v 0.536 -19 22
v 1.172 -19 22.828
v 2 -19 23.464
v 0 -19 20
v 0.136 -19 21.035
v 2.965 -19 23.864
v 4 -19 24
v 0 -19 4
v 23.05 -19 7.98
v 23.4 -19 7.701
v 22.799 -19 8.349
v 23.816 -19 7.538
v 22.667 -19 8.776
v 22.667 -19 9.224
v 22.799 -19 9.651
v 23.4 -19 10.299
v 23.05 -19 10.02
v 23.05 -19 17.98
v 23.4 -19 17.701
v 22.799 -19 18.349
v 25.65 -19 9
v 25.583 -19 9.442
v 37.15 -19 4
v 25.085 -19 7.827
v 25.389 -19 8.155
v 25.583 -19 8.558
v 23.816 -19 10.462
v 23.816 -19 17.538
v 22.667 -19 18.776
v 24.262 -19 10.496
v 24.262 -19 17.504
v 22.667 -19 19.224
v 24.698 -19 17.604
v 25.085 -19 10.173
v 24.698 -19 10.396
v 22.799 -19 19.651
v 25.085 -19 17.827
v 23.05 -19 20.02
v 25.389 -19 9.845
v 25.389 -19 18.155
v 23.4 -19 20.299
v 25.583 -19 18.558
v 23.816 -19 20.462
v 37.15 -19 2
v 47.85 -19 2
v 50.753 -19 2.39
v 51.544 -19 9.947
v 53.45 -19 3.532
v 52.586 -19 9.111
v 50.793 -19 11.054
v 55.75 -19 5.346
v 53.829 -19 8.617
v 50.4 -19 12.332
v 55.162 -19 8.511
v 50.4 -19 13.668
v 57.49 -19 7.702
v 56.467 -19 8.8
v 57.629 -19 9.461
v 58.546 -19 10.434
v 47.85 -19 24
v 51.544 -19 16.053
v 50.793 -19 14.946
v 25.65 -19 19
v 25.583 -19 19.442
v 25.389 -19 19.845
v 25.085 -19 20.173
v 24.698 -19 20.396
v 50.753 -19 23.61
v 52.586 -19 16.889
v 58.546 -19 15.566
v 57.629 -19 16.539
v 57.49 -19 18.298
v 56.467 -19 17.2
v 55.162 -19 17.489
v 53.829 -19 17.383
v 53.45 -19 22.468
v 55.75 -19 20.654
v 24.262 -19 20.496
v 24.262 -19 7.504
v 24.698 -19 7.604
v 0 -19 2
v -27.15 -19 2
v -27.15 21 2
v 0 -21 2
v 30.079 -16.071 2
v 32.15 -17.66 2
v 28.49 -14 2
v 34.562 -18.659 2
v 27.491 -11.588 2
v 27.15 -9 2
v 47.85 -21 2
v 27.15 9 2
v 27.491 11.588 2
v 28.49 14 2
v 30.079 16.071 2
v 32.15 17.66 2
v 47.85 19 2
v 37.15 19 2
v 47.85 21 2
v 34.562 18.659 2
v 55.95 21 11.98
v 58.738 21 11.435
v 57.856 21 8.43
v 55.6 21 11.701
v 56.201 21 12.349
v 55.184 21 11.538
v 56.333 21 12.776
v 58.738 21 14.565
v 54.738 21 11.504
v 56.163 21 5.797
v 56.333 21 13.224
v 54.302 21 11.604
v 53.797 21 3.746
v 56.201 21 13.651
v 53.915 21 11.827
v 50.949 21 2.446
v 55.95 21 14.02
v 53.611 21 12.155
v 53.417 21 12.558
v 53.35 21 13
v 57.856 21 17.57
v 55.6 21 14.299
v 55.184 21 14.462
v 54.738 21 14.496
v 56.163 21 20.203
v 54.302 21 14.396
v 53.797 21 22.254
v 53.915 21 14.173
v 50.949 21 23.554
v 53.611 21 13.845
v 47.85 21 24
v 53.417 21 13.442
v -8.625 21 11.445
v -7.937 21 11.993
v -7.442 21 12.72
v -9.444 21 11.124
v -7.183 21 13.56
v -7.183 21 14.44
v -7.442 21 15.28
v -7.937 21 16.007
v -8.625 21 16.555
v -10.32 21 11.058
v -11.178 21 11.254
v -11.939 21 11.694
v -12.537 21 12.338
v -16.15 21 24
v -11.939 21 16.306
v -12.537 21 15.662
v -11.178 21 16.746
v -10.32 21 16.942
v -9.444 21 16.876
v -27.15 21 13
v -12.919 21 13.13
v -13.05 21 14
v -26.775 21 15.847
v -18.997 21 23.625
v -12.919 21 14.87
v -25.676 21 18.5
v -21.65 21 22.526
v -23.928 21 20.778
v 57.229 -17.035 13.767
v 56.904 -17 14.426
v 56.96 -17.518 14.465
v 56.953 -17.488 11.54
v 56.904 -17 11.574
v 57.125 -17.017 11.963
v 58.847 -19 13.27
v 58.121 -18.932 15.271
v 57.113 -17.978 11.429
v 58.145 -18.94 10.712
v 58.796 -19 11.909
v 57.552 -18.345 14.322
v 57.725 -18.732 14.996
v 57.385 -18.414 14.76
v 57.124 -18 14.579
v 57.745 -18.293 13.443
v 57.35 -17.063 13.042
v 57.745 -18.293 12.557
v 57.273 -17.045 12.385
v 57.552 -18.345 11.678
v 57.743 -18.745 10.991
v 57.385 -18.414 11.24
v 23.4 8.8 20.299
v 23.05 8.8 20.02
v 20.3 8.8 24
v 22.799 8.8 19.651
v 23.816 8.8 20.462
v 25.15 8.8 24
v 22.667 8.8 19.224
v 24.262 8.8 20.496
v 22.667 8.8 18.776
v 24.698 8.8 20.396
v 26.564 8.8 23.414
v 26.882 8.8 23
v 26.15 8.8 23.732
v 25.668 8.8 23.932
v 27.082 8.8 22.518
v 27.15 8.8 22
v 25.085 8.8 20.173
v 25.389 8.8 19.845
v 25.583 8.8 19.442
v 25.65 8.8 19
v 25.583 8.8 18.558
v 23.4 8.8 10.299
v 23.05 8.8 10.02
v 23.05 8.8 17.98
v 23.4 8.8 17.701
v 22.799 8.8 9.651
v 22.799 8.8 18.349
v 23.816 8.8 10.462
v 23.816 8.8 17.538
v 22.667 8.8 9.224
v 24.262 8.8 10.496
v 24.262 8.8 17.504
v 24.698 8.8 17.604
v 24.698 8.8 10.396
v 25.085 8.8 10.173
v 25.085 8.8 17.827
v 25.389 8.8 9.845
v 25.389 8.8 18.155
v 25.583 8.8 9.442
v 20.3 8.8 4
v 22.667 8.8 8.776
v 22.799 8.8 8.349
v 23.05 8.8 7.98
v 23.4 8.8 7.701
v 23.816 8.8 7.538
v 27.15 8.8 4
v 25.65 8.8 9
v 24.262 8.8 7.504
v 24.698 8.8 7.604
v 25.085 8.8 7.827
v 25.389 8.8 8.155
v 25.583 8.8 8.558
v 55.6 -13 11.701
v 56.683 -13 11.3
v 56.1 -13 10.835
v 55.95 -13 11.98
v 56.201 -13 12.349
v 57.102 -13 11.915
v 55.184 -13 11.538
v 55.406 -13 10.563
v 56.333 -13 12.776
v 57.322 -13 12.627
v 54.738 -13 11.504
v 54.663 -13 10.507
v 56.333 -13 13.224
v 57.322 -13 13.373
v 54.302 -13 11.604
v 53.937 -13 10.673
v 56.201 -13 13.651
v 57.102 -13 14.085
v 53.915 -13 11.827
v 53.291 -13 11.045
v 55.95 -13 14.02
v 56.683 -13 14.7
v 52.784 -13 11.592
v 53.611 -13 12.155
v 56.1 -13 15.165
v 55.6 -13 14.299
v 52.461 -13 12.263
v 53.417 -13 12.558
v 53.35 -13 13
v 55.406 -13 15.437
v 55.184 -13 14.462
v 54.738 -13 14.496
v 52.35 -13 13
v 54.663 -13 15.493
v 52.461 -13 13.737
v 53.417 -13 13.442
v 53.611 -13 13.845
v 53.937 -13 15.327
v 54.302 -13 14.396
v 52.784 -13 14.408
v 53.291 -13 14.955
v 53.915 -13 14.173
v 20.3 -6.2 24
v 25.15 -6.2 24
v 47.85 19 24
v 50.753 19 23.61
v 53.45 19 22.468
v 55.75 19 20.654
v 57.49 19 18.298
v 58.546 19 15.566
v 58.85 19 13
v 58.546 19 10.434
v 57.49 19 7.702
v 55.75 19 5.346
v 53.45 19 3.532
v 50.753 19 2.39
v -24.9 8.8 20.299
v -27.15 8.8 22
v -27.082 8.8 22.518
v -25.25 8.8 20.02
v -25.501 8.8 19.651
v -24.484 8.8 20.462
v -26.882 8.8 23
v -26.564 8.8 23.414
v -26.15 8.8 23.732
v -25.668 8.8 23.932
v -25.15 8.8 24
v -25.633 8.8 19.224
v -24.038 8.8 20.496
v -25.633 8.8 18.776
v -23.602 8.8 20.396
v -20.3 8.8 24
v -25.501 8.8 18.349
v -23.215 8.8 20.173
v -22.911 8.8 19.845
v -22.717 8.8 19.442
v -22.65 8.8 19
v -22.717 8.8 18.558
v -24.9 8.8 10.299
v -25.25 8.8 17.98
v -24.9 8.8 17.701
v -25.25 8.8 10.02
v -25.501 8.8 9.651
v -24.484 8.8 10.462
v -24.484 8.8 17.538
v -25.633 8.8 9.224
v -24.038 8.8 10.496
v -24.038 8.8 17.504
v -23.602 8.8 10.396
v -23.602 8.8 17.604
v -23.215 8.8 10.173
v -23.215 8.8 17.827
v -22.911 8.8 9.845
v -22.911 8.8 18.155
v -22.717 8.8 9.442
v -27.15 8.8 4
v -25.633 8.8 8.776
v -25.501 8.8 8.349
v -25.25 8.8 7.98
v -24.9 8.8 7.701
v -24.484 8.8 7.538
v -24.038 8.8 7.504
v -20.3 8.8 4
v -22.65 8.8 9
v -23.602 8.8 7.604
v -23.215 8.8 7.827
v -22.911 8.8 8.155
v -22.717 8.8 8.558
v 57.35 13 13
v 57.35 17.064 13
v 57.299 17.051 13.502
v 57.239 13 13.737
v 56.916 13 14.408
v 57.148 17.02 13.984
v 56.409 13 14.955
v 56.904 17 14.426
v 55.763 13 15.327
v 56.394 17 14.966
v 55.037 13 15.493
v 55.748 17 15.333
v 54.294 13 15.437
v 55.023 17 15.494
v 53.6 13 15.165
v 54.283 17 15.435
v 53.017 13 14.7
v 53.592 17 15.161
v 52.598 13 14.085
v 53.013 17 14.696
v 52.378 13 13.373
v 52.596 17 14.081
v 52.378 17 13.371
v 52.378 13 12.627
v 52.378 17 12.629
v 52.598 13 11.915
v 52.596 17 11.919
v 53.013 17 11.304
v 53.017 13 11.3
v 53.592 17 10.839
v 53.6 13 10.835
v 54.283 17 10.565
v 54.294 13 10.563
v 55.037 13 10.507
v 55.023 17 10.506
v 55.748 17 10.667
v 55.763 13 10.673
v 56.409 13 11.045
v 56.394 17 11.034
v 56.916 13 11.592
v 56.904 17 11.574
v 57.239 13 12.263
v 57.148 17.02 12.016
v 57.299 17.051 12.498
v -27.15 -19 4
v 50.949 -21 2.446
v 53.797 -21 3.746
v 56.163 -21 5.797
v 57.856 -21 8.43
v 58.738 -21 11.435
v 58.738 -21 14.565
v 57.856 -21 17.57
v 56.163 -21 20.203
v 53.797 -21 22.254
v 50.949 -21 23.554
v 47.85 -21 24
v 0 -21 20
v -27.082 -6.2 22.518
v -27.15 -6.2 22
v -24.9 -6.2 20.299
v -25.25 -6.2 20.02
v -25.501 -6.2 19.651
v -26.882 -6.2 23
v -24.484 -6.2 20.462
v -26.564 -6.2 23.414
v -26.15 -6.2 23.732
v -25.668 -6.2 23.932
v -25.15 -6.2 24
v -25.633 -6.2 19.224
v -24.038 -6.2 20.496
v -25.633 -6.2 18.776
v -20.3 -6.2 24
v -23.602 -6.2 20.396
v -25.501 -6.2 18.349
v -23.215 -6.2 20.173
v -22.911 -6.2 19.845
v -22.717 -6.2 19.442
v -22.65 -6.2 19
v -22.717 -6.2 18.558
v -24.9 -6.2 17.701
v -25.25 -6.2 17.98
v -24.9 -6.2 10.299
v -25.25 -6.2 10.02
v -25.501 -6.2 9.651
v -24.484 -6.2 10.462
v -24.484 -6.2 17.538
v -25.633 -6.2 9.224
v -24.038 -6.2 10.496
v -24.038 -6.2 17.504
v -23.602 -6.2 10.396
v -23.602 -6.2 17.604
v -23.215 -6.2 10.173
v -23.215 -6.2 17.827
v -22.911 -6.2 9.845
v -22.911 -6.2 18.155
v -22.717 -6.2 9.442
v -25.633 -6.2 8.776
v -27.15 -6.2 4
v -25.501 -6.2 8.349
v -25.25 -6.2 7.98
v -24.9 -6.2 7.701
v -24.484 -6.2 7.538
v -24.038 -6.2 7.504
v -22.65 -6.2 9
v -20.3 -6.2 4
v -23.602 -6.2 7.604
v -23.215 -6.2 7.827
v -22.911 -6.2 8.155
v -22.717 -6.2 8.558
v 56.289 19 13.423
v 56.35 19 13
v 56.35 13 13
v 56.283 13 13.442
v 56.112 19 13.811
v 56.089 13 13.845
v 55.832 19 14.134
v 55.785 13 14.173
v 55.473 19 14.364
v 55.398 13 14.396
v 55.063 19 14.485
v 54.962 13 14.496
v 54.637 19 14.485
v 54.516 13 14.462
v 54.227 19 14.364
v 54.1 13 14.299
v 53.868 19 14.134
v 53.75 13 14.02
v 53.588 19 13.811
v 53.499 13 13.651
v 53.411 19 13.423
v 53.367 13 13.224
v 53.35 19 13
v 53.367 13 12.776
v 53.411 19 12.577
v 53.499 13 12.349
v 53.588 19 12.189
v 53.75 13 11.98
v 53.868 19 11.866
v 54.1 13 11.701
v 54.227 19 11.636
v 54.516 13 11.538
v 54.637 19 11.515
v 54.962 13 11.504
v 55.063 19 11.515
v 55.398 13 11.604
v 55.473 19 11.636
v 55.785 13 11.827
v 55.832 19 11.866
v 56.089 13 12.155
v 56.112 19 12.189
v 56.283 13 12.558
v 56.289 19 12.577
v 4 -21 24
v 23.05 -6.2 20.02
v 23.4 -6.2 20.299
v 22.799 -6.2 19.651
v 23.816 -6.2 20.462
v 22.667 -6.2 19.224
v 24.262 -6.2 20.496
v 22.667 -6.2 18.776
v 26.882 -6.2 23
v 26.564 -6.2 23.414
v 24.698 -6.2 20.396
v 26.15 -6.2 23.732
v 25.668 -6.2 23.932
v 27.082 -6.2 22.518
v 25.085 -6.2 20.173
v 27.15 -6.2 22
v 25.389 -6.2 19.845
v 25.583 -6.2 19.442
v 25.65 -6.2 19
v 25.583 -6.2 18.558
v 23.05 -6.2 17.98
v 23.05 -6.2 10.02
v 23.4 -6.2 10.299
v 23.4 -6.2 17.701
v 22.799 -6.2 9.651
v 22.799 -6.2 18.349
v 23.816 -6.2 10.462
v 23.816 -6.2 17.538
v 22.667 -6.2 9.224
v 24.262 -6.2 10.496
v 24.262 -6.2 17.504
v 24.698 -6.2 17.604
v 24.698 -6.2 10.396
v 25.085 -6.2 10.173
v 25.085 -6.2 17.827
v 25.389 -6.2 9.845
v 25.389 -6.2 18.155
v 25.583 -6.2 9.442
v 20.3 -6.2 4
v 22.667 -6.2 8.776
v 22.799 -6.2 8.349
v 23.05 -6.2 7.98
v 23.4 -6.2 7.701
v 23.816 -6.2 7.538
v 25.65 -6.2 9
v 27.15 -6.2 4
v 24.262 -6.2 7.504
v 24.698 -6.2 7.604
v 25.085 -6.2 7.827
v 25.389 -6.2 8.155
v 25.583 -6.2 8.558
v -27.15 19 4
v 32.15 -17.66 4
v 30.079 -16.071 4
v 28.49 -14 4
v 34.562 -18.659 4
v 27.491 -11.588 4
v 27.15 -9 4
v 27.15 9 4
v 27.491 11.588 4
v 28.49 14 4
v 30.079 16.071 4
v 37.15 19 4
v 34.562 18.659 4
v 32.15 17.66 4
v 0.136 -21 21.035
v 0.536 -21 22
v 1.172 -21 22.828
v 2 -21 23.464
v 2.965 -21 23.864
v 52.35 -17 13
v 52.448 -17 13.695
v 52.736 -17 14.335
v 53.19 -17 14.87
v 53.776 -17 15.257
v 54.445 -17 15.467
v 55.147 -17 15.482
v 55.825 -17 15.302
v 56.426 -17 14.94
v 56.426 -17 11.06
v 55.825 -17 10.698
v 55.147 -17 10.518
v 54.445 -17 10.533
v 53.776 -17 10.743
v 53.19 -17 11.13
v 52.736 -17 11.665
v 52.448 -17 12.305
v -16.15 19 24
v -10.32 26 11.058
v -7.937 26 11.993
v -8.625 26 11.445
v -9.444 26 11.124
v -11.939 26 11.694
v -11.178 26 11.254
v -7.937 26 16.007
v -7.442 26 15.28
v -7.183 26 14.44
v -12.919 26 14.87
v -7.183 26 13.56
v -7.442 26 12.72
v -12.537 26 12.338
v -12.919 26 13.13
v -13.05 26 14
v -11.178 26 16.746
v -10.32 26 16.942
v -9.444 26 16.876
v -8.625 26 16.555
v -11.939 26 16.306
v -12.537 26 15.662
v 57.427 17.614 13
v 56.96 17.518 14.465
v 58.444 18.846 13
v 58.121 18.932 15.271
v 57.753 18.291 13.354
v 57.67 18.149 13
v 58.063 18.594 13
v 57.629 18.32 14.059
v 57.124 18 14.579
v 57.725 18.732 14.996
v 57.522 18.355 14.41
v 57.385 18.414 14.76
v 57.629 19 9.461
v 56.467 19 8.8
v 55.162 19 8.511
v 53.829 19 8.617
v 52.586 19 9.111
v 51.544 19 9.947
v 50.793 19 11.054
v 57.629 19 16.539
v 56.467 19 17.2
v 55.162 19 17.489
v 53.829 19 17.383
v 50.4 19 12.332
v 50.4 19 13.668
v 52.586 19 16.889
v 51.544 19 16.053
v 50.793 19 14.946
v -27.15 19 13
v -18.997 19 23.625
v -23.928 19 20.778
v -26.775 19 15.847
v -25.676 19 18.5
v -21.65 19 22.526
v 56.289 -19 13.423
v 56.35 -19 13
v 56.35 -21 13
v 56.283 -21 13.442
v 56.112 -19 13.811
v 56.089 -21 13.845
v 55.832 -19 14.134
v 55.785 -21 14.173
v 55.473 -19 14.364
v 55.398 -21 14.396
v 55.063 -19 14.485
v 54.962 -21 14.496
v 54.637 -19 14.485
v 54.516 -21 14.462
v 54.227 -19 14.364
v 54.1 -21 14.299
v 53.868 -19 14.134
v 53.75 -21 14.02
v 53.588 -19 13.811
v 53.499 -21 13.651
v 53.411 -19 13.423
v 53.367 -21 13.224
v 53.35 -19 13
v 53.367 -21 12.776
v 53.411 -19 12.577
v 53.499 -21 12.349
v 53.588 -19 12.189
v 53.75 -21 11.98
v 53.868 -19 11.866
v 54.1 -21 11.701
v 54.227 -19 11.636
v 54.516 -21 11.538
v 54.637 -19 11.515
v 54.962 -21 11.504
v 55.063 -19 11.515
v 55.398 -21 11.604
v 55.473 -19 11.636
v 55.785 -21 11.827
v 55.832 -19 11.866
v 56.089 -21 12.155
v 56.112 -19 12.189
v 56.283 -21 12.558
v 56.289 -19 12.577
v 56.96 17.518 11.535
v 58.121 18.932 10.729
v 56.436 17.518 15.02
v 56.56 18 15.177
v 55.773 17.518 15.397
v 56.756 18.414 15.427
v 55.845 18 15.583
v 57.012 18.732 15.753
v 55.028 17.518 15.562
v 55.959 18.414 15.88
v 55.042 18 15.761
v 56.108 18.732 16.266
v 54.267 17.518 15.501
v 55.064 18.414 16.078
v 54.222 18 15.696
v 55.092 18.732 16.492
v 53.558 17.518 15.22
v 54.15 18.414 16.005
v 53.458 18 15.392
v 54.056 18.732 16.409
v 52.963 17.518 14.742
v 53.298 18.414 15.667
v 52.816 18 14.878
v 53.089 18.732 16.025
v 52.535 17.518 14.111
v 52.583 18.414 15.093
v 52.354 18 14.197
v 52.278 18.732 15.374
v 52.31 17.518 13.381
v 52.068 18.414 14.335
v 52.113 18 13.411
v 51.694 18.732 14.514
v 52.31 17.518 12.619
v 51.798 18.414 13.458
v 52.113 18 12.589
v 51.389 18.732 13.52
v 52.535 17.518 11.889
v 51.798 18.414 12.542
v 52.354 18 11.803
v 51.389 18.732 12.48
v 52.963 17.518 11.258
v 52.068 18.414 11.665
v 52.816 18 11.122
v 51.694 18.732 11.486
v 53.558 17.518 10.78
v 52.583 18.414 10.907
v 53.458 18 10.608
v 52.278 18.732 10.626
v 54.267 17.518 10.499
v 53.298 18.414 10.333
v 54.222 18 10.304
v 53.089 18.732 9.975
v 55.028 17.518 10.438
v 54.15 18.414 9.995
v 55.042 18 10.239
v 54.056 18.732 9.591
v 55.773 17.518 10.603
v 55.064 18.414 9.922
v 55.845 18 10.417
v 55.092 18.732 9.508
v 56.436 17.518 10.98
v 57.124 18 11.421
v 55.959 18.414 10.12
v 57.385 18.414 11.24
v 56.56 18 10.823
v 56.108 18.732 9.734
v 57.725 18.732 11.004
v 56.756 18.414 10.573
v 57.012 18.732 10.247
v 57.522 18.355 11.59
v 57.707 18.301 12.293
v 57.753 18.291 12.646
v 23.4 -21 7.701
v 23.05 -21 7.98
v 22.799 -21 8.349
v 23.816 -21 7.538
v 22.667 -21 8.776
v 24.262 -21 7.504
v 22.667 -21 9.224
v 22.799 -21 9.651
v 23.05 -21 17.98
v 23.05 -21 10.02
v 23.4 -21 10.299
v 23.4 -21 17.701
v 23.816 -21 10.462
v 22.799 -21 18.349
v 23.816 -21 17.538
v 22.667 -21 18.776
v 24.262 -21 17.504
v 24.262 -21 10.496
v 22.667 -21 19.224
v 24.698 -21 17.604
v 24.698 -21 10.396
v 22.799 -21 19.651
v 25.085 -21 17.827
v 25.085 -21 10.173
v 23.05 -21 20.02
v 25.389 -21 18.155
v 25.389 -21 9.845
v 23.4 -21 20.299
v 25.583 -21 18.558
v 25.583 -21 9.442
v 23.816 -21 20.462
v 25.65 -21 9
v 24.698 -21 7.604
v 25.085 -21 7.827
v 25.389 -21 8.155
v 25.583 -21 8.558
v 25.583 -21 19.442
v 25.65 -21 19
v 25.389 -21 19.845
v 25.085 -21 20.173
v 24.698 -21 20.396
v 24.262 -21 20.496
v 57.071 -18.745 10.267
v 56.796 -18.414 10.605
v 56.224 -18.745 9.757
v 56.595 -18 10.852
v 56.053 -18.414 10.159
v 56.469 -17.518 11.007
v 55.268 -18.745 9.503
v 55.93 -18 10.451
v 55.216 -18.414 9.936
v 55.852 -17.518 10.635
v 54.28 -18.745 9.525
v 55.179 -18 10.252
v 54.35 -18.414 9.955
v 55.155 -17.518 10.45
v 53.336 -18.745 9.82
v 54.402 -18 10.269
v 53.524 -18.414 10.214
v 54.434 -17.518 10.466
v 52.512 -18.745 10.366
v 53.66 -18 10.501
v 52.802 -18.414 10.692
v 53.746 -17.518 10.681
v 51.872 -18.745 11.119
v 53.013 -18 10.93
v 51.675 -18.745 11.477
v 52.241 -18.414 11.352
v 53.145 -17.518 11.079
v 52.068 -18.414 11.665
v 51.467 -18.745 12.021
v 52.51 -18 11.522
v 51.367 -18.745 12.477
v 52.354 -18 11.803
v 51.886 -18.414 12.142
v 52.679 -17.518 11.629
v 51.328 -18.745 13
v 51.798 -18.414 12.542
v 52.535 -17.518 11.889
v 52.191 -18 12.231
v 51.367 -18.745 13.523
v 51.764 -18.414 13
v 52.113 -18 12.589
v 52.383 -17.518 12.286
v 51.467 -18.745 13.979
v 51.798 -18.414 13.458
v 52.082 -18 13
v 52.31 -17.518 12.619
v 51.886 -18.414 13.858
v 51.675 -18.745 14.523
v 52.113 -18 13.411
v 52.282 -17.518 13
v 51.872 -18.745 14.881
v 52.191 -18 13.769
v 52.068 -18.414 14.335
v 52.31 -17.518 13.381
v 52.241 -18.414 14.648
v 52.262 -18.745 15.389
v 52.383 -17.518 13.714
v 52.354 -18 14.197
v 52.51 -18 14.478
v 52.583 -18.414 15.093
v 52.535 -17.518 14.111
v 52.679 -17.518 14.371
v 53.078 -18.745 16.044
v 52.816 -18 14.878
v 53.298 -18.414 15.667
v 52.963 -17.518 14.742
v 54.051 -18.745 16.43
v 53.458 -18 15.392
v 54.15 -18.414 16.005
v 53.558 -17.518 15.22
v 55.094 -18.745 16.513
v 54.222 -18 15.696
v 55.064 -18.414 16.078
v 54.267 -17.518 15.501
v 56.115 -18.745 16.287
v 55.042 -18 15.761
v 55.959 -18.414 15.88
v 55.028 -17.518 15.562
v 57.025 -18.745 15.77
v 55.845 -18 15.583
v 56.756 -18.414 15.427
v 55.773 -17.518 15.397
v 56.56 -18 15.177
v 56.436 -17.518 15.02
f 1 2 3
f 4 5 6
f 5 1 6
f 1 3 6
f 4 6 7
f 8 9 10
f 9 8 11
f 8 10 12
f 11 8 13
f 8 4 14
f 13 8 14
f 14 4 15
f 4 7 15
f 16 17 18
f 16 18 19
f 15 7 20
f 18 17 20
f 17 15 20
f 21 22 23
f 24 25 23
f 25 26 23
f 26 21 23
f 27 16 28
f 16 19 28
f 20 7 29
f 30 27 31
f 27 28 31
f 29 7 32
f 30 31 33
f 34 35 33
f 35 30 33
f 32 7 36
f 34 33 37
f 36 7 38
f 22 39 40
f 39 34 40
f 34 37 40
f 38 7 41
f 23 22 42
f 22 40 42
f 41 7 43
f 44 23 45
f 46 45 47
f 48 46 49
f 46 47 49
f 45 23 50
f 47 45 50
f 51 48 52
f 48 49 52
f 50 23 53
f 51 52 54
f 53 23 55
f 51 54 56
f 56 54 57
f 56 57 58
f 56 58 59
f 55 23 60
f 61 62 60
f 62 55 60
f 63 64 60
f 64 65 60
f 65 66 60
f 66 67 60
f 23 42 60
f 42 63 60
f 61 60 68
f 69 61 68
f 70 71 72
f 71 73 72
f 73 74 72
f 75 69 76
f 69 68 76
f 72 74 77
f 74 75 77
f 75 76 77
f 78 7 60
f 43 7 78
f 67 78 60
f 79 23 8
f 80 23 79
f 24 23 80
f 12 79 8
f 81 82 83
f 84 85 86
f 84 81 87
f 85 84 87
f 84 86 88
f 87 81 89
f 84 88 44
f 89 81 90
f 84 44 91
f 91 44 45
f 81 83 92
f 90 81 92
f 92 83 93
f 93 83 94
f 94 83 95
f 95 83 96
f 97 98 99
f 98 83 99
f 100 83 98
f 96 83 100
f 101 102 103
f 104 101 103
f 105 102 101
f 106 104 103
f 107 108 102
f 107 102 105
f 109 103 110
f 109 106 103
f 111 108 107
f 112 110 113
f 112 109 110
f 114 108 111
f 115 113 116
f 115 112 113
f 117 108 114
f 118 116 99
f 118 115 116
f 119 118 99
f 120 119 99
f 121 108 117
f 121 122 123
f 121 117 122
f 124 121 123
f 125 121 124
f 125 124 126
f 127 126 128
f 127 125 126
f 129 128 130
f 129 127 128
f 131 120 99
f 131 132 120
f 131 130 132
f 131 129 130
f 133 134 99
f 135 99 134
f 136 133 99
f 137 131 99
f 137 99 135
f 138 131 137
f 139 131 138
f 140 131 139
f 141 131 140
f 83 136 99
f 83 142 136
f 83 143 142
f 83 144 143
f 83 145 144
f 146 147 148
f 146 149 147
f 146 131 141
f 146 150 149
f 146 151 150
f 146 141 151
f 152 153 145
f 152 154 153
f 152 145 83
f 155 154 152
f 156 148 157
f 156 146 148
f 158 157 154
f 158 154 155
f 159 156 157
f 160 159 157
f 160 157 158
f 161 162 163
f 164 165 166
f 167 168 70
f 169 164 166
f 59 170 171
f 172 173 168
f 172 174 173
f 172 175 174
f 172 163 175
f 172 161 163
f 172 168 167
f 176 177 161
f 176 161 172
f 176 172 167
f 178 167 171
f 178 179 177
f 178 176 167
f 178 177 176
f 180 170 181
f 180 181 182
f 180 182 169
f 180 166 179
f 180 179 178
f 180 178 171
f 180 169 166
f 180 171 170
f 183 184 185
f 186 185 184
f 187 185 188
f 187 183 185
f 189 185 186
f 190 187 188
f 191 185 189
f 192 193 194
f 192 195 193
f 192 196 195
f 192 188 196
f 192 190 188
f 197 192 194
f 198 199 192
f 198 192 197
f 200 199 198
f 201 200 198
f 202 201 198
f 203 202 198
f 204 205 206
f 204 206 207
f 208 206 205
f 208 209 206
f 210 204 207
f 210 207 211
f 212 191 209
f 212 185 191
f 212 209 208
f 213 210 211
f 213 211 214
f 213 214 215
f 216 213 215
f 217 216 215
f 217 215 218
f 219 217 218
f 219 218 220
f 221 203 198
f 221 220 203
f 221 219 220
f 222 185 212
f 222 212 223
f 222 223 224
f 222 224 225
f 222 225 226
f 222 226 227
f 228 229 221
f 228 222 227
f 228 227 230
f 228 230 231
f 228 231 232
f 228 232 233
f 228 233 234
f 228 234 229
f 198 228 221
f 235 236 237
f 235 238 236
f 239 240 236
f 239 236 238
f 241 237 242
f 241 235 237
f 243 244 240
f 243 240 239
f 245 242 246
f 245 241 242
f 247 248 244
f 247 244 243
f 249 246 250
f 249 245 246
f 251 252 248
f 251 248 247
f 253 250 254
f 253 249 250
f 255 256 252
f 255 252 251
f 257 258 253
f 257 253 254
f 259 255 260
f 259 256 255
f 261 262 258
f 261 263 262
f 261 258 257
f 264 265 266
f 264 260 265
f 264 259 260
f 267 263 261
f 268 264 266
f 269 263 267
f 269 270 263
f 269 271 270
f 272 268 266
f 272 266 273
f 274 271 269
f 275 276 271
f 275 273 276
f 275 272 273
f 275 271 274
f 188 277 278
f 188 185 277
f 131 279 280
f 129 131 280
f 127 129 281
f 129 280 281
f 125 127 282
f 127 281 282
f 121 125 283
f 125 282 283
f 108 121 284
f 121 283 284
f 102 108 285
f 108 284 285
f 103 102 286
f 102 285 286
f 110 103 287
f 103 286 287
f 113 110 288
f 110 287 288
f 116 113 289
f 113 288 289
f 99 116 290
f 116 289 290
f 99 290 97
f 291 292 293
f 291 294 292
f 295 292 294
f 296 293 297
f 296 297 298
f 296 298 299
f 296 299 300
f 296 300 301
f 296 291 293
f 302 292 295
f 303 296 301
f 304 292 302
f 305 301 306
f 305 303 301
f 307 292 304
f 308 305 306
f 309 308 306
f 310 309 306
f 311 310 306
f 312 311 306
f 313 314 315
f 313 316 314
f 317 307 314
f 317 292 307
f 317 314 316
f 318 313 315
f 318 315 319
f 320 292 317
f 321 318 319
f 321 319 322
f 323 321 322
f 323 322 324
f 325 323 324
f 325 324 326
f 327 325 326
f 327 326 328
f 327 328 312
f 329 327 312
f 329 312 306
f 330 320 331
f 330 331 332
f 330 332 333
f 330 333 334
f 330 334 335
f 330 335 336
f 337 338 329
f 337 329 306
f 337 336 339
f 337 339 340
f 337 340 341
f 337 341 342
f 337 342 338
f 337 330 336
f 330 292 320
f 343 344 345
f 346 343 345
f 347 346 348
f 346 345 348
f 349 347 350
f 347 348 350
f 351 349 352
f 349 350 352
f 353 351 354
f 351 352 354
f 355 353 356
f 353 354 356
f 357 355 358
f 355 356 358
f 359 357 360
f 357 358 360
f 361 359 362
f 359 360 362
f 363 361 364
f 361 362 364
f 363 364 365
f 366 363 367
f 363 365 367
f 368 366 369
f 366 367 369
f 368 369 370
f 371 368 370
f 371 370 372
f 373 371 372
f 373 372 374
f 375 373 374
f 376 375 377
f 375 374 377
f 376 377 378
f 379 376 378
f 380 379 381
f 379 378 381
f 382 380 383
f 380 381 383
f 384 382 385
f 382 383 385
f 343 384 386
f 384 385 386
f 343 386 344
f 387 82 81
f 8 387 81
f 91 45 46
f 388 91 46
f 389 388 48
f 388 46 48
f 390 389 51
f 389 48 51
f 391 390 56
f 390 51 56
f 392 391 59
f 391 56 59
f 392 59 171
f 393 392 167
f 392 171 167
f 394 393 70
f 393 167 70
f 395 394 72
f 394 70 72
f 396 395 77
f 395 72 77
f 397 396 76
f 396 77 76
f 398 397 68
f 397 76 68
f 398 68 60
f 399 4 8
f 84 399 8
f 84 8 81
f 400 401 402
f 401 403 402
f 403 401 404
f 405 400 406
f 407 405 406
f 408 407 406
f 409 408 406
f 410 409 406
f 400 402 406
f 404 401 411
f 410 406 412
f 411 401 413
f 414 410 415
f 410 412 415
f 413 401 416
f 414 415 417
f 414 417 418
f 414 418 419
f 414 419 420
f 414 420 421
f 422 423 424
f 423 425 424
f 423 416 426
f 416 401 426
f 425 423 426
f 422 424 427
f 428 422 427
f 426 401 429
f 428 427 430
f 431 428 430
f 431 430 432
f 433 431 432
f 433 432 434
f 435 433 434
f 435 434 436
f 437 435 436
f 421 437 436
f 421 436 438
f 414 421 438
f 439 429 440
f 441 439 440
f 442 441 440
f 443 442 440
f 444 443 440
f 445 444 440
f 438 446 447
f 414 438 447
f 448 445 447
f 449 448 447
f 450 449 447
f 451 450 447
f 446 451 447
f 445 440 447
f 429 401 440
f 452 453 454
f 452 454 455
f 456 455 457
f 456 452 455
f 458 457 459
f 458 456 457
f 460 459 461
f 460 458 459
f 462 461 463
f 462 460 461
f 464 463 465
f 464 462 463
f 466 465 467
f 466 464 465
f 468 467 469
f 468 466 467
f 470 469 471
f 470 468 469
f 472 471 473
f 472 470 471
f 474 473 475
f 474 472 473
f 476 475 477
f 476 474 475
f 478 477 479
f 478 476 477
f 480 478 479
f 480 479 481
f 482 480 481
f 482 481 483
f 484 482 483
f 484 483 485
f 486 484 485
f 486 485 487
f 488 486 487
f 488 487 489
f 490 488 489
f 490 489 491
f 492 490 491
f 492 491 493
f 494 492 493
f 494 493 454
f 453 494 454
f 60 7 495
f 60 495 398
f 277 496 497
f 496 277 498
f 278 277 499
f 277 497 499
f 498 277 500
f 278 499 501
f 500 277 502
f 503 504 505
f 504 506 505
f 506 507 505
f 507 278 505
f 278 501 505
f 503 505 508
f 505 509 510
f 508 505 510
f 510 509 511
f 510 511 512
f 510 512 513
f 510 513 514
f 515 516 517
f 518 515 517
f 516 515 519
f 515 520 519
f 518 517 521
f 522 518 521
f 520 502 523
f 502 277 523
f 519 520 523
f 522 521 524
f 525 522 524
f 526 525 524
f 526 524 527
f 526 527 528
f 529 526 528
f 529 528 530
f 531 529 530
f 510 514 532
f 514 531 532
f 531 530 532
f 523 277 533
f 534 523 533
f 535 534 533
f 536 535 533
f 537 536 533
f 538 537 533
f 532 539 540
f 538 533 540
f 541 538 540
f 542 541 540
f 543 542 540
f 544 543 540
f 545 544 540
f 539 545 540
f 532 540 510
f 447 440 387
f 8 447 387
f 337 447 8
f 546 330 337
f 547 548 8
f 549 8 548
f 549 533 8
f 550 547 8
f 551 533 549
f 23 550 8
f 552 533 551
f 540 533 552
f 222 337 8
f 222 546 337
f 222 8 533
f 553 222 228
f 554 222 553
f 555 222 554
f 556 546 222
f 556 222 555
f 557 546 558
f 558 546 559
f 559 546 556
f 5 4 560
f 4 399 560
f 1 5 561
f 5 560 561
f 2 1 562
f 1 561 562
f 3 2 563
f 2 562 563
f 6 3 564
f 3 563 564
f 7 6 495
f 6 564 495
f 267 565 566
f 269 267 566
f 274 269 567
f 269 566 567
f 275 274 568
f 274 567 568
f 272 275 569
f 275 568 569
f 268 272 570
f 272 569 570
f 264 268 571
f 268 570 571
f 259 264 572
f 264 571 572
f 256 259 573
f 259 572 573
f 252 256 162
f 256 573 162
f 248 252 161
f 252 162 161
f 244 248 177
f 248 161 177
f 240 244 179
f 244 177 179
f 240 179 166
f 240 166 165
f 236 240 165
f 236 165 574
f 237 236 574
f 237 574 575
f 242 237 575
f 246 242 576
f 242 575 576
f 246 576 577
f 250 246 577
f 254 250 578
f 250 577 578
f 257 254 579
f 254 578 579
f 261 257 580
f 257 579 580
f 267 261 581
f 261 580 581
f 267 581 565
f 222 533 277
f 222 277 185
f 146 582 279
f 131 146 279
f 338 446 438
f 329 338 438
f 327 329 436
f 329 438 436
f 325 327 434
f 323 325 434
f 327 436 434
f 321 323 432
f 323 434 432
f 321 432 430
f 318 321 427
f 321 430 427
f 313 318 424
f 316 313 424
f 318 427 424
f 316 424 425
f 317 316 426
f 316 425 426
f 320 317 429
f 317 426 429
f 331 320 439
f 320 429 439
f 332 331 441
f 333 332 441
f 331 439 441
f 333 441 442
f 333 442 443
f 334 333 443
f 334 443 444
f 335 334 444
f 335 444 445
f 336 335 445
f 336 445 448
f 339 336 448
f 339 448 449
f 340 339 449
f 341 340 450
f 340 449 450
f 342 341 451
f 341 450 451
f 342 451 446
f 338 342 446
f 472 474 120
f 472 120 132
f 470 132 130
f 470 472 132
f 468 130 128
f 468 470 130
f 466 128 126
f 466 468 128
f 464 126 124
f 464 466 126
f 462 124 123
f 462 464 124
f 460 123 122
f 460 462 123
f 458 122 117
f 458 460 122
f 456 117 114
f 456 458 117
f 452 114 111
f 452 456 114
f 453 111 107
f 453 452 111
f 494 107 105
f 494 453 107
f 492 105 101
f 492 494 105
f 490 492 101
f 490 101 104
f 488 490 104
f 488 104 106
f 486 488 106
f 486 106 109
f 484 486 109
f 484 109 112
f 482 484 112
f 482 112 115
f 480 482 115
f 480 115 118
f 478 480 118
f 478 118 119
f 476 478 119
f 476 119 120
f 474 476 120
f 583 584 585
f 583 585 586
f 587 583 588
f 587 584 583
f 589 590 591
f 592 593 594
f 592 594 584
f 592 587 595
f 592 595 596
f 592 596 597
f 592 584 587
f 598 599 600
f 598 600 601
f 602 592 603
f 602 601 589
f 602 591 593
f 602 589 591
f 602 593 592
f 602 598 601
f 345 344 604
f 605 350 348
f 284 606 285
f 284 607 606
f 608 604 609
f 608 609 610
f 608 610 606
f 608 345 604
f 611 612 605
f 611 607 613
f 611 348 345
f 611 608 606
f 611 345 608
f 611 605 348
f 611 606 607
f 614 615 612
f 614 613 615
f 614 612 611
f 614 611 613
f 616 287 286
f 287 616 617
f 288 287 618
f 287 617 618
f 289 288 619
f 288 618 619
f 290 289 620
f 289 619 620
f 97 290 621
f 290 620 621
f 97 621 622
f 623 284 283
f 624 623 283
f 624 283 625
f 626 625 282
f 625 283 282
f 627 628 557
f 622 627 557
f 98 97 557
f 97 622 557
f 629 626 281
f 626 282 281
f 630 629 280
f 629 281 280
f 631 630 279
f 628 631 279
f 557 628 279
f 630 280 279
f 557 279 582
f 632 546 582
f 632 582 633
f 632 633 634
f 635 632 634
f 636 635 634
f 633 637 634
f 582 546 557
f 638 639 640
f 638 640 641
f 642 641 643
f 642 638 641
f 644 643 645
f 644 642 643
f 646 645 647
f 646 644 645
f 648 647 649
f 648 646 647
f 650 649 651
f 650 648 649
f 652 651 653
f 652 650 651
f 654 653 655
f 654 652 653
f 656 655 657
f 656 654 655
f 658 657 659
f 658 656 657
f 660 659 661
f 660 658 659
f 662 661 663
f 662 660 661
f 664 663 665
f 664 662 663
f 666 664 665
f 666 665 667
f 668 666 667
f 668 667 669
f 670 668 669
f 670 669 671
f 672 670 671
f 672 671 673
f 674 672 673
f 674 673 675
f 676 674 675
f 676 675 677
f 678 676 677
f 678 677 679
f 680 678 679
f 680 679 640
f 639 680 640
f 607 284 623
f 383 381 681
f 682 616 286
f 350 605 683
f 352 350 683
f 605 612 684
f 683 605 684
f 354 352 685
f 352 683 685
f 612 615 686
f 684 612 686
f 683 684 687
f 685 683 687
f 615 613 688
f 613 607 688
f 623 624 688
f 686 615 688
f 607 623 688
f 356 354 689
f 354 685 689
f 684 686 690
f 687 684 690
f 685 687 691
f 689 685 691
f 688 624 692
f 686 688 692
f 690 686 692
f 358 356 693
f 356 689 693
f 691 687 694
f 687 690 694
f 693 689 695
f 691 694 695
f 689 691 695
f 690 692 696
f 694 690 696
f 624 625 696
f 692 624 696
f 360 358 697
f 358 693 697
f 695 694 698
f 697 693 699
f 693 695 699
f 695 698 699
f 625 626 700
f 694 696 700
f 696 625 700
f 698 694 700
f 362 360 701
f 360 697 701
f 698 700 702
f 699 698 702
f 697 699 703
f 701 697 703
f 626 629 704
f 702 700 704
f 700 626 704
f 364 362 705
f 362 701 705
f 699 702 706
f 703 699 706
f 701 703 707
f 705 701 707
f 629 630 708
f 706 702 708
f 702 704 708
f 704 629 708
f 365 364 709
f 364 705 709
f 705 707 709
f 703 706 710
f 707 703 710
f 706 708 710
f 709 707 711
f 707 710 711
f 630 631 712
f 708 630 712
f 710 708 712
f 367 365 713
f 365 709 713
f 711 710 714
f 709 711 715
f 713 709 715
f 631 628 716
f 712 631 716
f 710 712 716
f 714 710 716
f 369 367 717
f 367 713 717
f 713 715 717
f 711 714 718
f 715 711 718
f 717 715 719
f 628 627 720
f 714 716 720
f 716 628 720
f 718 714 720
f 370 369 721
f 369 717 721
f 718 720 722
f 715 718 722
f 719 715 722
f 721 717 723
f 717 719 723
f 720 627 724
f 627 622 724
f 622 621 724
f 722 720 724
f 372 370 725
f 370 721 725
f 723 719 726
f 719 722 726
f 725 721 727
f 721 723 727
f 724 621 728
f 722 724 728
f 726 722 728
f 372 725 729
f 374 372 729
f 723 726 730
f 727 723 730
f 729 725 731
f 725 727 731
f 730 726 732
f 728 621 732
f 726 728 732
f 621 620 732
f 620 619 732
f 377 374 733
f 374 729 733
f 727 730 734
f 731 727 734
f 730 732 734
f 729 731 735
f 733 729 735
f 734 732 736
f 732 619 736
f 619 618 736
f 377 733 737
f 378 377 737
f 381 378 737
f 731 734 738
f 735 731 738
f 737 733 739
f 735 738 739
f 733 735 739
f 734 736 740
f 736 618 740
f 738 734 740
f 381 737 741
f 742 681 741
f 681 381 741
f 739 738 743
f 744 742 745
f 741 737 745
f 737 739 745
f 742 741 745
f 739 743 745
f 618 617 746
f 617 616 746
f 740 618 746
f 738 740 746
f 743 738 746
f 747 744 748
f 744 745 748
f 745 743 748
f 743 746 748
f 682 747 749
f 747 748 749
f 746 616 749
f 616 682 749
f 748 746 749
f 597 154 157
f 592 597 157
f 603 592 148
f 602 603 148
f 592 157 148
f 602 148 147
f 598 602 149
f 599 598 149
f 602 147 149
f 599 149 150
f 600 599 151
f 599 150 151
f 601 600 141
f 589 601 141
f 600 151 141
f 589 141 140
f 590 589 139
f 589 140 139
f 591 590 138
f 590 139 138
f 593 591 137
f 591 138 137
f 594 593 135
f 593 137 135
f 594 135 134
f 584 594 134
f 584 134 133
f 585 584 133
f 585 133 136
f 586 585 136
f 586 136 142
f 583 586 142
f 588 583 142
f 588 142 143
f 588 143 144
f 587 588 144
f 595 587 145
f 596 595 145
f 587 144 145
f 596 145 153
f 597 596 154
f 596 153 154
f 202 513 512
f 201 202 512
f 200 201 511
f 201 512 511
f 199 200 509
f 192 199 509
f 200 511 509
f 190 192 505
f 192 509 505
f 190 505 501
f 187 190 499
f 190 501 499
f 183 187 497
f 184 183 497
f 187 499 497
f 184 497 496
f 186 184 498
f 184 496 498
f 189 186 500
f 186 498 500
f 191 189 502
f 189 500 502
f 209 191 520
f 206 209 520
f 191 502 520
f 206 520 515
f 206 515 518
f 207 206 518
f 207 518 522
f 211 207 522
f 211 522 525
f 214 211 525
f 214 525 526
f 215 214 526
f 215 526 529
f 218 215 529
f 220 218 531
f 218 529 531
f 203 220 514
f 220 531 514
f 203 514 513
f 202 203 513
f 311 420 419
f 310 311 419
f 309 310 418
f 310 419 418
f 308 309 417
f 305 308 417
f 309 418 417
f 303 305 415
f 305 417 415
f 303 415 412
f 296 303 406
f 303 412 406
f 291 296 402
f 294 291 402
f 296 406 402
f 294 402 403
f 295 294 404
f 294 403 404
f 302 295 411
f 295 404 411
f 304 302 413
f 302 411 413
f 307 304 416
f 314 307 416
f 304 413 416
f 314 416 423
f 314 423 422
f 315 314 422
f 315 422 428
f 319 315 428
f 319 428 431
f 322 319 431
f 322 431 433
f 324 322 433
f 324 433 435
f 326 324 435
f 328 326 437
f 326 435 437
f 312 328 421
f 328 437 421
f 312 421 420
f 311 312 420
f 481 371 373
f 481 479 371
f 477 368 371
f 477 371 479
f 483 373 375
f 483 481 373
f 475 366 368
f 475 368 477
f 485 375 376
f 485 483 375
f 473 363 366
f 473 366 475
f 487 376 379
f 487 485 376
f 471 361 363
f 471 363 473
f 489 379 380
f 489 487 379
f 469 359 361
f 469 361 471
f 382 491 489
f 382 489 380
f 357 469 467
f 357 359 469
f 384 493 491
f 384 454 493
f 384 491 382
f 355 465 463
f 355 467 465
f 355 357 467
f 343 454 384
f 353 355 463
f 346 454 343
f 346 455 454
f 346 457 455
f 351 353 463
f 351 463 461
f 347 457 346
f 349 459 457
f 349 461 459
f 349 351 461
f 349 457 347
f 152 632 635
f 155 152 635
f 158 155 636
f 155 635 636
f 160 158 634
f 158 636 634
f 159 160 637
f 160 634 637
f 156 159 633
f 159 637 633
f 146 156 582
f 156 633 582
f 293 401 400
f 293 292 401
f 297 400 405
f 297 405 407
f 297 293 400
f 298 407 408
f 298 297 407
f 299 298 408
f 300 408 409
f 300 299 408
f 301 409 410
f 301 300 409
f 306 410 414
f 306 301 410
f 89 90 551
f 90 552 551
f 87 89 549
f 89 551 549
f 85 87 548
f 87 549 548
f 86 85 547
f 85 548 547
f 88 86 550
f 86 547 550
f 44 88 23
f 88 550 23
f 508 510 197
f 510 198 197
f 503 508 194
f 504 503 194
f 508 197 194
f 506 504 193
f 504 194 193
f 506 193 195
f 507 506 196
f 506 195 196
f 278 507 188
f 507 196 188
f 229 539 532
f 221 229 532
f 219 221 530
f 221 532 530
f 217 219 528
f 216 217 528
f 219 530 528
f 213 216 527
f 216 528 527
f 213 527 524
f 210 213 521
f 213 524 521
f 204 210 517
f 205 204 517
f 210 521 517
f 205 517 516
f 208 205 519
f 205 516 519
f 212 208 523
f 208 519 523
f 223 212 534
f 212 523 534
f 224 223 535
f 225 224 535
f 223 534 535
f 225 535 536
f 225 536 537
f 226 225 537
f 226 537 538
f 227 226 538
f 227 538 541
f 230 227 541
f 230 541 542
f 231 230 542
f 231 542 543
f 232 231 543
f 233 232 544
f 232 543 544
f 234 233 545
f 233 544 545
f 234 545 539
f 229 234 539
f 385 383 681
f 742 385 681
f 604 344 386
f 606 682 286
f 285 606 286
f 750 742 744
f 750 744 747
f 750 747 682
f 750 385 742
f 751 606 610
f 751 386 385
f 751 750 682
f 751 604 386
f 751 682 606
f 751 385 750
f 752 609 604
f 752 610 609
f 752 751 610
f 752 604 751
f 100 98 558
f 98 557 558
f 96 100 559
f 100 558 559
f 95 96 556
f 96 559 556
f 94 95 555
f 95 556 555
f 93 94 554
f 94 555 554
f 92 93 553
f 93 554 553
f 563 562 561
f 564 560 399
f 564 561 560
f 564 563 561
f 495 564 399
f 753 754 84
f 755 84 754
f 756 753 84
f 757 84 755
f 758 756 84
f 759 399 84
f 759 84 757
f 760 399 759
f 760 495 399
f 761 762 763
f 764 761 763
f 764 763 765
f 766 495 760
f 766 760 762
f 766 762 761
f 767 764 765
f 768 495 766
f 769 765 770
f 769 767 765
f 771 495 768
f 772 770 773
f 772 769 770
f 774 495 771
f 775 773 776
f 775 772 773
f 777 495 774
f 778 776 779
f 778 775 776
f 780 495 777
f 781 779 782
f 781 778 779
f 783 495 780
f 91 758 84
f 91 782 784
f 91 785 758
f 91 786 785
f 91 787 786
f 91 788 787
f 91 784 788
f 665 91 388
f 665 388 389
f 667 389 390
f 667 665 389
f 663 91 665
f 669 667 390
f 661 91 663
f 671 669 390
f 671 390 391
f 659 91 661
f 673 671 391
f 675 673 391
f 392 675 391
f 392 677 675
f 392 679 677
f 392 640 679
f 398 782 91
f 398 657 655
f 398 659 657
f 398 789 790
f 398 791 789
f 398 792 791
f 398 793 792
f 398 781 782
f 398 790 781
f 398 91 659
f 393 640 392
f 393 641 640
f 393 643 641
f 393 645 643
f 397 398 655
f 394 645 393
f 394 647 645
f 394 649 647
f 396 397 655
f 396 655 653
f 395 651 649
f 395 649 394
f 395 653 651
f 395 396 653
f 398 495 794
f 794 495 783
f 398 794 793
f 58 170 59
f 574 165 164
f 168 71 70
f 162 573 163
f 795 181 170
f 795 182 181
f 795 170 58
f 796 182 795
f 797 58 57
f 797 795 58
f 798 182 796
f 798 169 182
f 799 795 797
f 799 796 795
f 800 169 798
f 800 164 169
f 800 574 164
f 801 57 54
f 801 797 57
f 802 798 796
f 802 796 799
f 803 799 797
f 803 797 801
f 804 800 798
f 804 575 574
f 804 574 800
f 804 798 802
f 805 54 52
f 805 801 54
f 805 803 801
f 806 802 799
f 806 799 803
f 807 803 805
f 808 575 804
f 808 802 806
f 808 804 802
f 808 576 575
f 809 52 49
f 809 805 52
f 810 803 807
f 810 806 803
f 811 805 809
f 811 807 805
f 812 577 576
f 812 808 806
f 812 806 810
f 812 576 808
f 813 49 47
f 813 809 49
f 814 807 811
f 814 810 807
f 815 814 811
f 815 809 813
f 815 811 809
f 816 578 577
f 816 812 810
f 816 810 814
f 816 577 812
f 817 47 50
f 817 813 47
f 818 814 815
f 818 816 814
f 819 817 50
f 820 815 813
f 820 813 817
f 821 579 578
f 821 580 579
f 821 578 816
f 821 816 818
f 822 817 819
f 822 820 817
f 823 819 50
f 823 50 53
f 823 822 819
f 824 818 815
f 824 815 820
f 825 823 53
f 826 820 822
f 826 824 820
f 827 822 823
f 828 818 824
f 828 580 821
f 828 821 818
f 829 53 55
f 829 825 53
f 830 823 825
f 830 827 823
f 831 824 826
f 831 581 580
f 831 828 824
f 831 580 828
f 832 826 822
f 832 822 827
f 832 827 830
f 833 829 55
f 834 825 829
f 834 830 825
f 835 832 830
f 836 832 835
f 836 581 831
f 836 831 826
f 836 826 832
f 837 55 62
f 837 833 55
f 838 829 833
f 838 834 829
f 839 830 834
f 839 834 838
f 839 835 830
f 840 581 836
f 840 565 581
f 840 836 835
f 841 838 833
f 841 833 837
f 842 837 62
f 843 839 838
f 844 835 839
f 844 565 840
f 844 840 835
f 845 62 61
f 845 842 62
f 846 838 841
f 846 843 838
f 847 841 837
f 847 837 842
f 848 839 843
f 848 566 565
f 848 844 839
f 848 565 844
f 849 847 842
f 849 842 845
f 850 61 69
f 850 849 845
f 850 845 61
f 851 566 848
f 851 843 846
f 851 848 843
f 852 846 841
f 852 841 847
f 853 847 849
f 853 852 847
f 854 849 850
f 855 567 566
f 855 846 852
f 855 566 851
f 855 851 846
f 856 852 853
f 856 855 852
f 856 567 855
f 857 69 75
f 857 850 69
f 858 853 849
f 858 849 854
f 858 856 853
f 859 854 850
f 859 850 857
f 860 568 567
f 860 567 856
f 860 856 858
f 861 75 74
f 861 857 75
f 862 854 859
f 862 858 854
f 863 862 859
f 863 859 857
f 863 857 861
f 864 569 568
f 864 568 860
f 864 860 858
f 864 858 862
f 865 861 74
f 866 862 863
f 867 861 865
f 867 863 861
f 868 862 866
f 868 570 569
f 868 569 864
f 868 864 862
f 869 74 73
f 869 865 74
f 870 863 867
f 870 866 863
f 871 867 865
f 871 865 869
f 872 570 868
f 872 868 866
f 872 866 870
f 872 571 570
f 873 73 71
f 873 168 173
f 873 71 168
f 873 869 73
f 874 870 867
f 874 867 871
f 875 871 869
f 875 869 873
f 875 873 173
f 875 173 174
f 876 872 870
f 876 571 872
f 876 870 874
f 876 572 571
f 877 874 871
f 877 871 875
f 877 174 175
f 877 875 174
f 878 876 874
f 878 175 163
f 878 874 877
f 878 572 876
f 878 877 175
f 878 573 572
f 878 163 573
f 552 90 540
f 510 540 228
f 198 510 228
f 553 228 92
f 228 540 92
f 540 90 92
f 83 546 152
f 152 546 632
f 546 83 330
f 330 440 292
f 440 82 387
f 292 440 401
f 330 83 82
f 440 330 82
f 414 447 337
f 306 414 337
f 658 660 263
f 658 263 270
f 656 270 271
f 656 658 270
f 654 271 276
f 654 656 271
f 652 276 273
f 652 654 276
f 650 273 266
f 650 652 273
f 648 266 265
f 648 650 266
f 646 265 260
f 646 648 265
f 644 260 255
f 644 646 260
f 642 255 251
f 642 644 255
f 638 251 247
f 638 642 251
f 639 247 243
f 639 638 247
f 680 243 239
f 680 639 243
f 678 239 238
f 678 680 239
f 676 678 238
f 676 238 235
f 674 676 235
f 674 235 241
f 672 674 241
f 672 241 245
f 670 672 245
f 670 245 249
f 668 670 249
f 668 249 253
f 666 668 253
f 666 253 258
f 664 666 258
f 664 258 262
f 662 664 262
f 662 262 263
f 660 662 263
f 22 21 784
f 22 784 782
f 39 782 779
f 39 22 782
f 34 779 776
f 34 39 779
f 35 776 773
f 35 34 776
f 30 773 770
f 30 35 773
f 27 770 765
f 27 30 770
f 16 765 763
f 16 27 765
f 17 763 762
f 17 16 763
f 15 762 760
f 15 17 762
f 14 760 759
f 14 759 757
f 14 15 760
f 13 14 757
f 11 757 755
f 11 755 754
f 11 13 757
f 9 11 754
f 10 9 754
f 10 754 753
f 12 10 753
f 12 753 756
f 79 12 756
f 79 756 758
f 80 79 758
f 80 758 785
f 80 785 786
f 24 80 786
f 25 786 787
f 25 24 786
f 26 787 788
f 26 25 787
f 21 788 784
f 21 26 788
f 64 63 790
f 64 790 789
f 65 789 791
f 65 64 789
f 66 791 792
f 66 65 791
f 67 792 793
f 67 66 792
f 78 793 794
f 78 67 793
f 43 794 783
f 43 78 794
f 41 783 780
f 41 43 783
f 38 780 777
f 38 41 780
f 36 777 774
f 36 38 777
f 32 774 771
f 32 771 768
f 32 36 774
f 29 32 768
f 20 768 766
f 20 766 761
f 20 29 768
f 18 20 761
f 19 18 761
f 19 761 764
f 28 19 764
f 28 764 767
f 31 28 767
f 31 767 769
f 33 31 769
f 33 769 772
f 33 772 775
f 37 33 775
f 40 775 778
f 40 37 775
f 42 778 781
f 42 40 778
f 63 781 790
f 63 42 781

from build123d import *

# Parameters (mm, degrees)
SKETCH_W        = 54.3
SKETCH_H        = 38
PAD_DEPTH       = 2
SKETCH003_W     = 6.85
SKETCH003_H     = 15
PAD001_DEPTH    = 20
SKETCH010_W     = 6.85
SKETCH010_H     = 15
PAD002_DEPTH    = 20
SKETCH004_R     = 1.5
POCKET_DEPTH    = 15
SKETCH002_R     = 1.5
POCKET001_DEPTH = 15
SKETCH005_R     = 1.5
PAD003_DEPTH    = 2
SKETCH007_R     = 1.5
PAD004_DEPTH    = 2
SKETCH006_R     = 2.95
PAD005_DEPTH    = 5
SKETCH008_R     = 2.5
SKETCH008_R_2   = 1.5
PAD006_DEPTH    = 6
SKETCH009_R     = 2.5
SKETCH009_R_2   = 1.5
PAD007_DEPTH    = 6
FILLET_R        = 10
FILLET001_R     = 10
FILLET002_R     = 2
FILLET003_R     = 2
FILLET004_R     = 2
FILLET005_R     = 2
FILLET006_R     = 4


with BuildPart() as part:
    # Sketch → Pad (new body)
    with BuildSketch(Plane.XY.offset(2)):
        Rectangle(SKETCH_W, SKETCH_H)
    extrude(amount=PAD_DEPTH)

    # Sketch003 (on Face6 of Pad) → Pad001 (join)
    with BuildSketch(Plane.XY.offset(4)):
        with Locations((23.725, 1.3)):
            Rectangle(SKETCH003_W, SKETCH003_H)
    extrude(amount=PAD001_DEPTH)

    # Sketch010 (on Face5 of Pad001) → Pad002 (join)
    with BuildSketch(Plane.XY.offset(4)):
        with Locations((-23.725, 1.3)):
            Rectangle(SKETCH010_W, SKETCH010_H)
    extrude(amount=PAD002_DEPTH)

    # Sketch004 (on Face12 of Pad002) → Pocket (cut)
    with BuildSketch(Plane(origin=(0, -6.2, 2), x_dir=(1, 0, 0), z_dir=(0, -1, 0))):
        with Locations((-24.15, 7)):
            Circle(SKETCH004_R)
        with Locations((-24.15, 17)):
            Circle(SKETCH004_R)
    extrude(amount=-POCKET_DEPTH, mode=Mode.SUBTRACT)

    # Sketch002 (on Face11 of Pocket) → Pocket001 (cut)
    with BuildSketch(Plane(origin=(0, -6.2, 2), x_dir=(1, 0, 0), z_dir=(0, -1, 0))):
        with Locations((24.15, 17)):
            Circle(SKETCH002_R)
        with Locations((24.15, 7)):
            Circle(SKETCH002_R)
    extrude(amount=-POCKET001_DEPTH, mode=Mode.SUBTRACT)

    # Sketch005 (on Face1 of Pocket001) → Pad003 (join)
    with BuildSketch(Plane(origin=(0, 19, 2), x_dir=(-1, 0, 0), z_dir=(0, 1, 0))):
        with BuildLine():
            Line((16.15, 22), (-47.85, 22))
            ThreePointArc((-47.85, 22), (-58.85, 11), (-47.85, 0))
            Line((27.15, 0), (-47.85, 0))
            Line((27.15, 0), (27.15, 11))
            ThreePointArc((27.15, 11), (23.928175, 18.778175), (16.15, 22))
        make_face()
        with Locations((-54.85, 11)):
            Circle(SKETCH005_R, mode=Mode.SUBTRACT)
    extrude(amount=PAD003_DEPTH)

    # Sketch007 (on Face2 of Pad003) → Pad004 (join)
    with BuildSketch(Plane(origin=(0, -19, 2), x_dir=(1, 0, 0), z_dir=(0, -1, 0))):
        with BuildLine():
            Line((0, 22), (0, 0))
            Line((0, 0), (47.85, 0))
            ThreePointArc((47.85, 0), (58.85, 11), (47.85, 22))
            Line((0, 22), (47.85, 22))
        make_face()
        with Locations((54.85, 11)):
            Circle(SKETCH007_R, mode=Mode.SUBTRACT)
        with Locations((24.15, 7)):
            Circle(SKETCH007_R, mode=Mode.SUBTRACT)
        with Locations((24.15, 17)):
            Circle(SKETCH007_R, mode=Mode.SUBTRACT)
    extrude(amount=PAD004_DEPTH)

    # Sketch006 (on Face11 of Pad004) → Pad005 (join)
    with BuildSketch(Plane(origin=(0, 21, 2), x_dir=(-1, 0, 0), z_dir=(0, 1, 0))):
        with Locations((10.1, 12)):
            Circle(SKETCH006_R)
    extrude(amount=PAD005_DEPTH)

    # Sketch008 (on Face17 of Pad005) → Pad006 (join)
    with BuildSketch(Plane(origin=(0, -19, 2), x_dir=(-1, 0, 0), z_dir=(0, 1, 0))):
        with Locations((-54.85, 11)):
            Circle(SKETCH008_R)
        with Locations((-54.85, 11)):
            Circle(SKETCH008_R_2, mode=Mode.SUBTRACT)
    extrude(amount=PAD006_DEPTH)

    # Sketch009 (on Face10 of Pad006) → Pad007 (join)
    with BuildSketch(Plane(origin=(0, 19, 2), x_dir=(1, 0, 0), z_dir=(0, -1, 0))):
        with Locations((54.85, 11)):
            Circle(SKETCH009_R)
        with Locations((54.85, 11)):
            Circle(SKETCH009_R_2, mode=Mode.SUBTRACT)
    extrude(amount=PAD007_DEPTH)

    # Fillet
    fillet_edges = [part.edges().sort_by_distance(p)[0] for p in [
        (27.15, -19, 3),
    ]]
    fillet(fillet_edges, radius=FILLET_R)

    # Fillet001
    fillet001_edges = [part.edges().sort_by_distance(p)[0] for p in [
        (27.15, 19, 3),
    ]]
    fillet(fillet001_edges, radius=FILLET001_R)

    # Fillet002
    fillet002_edges = [part.edges().sort_by_distance(p)[0] for p in [
        (52.35, 19, 13),
    ]]
    fillet(fillet002_edges, radius=FILLET002_R)

    # Fillet003
    fillet003_edges = [part.edges().sort_by_distance(p)[0] for p in [
        (57.35, -19, 13),
    ]]
    fillet(fillet003_edges, radius=FILLET003_R)

    # Fillet004
    fillet004_edges = [part.edges().sort_by_distance(p)[0] for p in [
        (27.15, 1.3, 24),
    ]]
    fillet(fillet004_edges, radius=FILLET004_R)

    # Fillet005
    fillet005_edges = [part.edges().sort_by_distance(p)[0] for p in [
        (-27.15, 1.3, 24),
    ]]
    fillet(fillet005_edges, radius=FILLET005_R)

    # Fillet006
    fillet006_edges = [part.edges().sort_by_distance(p)[0] for p in [
        (0, -20, 24),
    ]]
    fillet(fillet006_edges, radius=FILLET006_R)


solid = part.part
